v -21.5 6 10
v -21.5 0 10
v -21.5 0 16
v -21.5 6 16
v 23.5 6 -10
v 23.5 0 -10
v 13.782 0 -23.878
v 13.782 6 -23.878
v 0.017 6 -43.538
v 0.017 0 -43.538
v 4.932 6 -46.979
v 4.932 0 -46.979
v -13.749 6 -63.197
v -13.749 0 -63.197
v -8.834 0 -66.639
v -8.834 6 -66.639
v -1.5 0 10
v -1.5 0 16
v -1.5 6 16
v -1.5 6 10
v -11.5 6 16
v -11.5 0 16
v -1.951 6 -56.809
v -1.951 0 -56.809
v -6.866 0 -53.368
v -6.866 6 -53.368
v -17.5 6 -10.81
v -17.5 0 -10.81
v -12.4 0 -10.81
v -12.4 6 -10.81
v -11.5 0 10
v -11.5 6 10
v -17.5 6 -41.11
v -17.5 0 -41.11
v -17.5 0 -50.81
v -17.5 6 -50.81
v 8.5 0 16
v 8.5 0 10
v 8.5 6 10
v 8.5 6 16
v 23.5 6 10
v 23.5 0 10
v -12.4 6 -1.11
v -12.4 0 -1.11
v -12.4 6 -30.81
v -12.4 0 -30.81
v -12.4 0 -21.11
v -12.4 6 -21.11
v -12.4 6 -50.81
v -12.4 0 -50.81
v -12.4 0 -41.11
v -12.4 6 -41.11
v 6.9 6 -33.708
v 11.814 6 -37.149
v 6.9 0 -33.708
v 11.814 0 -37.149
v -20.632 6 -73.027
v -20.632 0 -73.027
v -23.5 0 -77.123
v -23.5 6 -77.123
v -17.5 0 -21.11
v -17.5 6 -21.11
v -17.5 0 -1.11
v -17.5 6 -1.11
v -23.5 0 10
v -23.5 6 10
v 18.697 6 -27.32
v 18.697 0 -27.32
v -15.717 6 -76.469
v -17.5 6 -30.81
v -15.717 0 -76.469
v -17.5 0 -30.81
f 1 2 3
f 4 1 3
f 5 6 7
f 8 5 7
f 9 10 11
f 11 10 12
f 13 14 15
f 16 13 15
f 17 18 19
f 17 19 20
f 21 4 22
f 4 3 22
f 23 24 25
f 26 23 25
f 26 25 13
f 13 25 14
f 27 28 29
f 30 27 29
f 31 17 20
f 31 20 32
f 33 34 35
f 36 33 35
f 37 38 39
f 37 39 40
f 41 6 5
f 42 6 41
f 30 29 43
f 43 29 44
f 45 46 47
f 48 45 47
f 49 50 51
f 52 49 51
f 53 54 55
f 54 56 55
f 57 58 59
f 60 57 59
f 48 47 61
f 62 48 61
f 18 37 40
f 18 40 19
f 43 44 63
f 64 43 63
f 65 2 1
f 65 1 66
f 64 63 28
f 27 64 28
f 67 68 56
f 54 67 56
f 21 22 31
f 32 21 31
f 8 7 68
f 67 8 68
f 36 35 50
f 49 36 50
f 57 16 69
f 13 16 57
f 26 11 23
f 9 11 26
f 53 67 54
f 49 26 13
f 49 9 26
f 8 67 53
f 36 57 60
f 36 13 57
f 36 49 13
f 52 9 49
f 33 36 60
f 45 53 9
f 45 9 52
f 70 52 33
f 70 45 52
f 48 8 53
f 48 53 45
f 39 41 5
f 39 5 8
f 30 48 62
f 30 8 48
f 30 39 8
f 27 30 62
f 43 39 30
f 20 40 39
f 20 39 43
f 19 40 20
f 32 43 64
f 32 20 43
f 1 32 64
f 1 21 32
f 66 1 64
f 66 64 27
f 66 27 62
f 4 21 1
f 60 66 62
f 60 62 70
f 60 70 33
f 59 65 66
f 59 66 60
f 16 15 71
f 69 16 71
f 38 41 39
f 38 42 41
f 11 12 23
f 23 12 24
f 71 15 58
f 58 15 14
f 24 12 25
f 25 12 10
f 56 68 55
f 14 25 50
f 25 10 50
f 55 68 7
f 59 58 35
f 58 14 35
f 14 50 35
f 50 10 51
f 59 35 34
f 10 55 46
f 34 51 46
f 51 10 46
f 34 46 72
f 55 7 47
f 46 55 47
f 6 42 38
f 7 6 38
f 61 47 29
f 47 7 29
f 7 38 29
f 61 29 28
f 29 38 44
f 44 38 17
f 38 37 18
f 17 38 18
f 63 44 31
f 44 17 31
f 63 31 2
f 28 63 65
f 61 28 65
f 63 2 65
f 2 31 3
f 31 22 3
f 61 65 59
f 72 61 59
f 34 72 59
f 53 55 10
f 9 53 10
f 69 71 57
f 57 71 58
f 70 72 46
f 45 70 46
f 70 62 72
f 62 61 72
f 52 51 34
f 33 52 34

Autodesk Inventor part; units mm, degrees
ref_plane "YZ Plane" through (0, 0, 0) normal (1, 0, 0) x (0, 1, 0)
ref_plane "XZ Plane" through (0, 0, 0) normal (0, 1, 0) x (-1, 0, 0)
ref_plane "XY Plane" through (0, 0, 0) normal (0, 0, 1) x (1, 0, 0)
sketch "Sketch2" plane through (0, 0, 0) normal (0, 1, 0) x (-1, 0, 0)
  line L0 (-23.5, 10) -> (23.5, 10)
  line L1 (23.5, 10) -> (23.5, -10)
  line L2 (23.5, -10) -> (17.5, -10)
  line L3 (-23.5, -10) -> (-23.5, 10)
  line L4 (-23.5, 10) -> (23.5, -10) construction
  line L5 (23.5, 10) -> (-23.5, -10) construction
  line L6 (21.5, 16) -> (11.5, 16)
  line L7 (11.5, 16) -> (11.5, 10)
  line L8 (11.5, 10) -> (21.5, 10)
  line L9 (21.5, 10) -> (21.5, 16)
  line L10 (-23.5, -10) -> (23.5, -77.123)
  line L11 (-23.5, -10) -> (58.442, -10) construction
  line L12 (23.5, -77.123) -> (23.5, -10)
  line L13 (20.6321, -73.0272) -> (13.7492, -63.1974)
  line L14 (13.7492, -63.1974) -> (8.8343, -66.6388)
  line L15 (8.8343, -66.6388) -> (15.7172, -76.4687)
  line L16 (15.7172, -76.4687) -> (20.6321, -73.0272)
  line L17 (6.8663, -53.3675) -> (-0.0166, -43.5377)
  line L18 (1.9514, -56.809) -> (6.8663, -53.3675)
  line L19 (-4.9315, -46.9792) -> (1.9514, -56.809)
  line L20 (-0.0166, -43.5377) -> (-4.9315, -46.9792)
  line L21 (-6.8996, -33.7079) -> (-13.7825, -23.8781)
  line L22 (-11.8145, -37.1494) -> (-6.8996, -33.7079)
  line L23 (-18.6974, -27.3195) -> (-11.8145, -37.1494)
  line L24 (-13.7825, -23.8781) -> (-18.6974, -27.3195)
  line L25 (1.5, 10) -> (-8.5, 10)
  line L26 (-8.5, 10) -> (-8.5, 16)
  line L27 (-8.5, 16) -> (1.5, 16)
  line L28 (1.5, 16) -> (1.5, 10)
  line L29 (-19.5182, -15.6866) -> (-23.5, -10)
  line L30 (-23.5, -10) -> (-28.4149, -13.4415)
  line L31 (-28.4149, -13.4415) -> (-24.4331, -19.128)
  line L32 (-24.4331, -19.128) -> (-19.5182, -15.6866)
  line L33 (17.5, -50.8098) -> (12.4, -50.8098)
  line L34 (12.4, -50.8098) -> (12.4, -41.1098)
  line L35 (12.4, -41.1098) -> (17.5, -41.1098)
  line L36 (17.5, -41.1098) -> (17.5, -50.8098)
  line L37 (17.5, -30.8098) -> (12.4, -30.8098)
  line L38 (17.5, -21.1098) -> (17.5, -30.8098)
  line L39 (12.4, -21.1098) -> (17.5, -21.1098)
  line L40 (12.4, -30.8098) -> (12.4, -21.1098)
  line L41 (17.5, -10.8098) -> (12.4, -10.8098)
  line L42 (17.5, -1.1098) -> (17.5, -10.8098)
  line L43 (12.4, -1.1098) -> (17.5, -1.1098)
  line L44 (12.4, -10.8098) -> (12.4, -1.1098)
  line L45 (12.4, -10) -> (-23.5, -10)
  line L46 (17.5, -10) -> (12.4, -10)
  point P0 (0, 0)
  dimension "d9" = 20
  dimension "d19" = 10
  dimension "d20" = 6
  dimension "d21" = 2
  dimension "d41" = 55
  dimension "d42" = 6
  dimension "d45" = 24
  dimension "d50" = 5
  dimension "d51" = 12
  dimension "d52" = 10
  dimension "d53" = 6
  dimension "d54" = 10
  dimension "d55" = 47
  dimension "d56" = 10
  dimension "d57" = 5.1
  dimension "d58" = 9.7
  dimension "d61" = 20
  dimension "d66" = 6
  dimension "d67" = 6
extrude "Extrusion2" add sketch "Sketch2" along normal blind 6 contours L0 L1 L2 L42 L43 L44 L45 L3 | L26 L27 L28 L0 | L45 L44 L41 L42 L2 L12 L10 | L7 L6 L9 L0 | L10 L22 L23 L24 | L10 L18 L19 L20 | L16 L15 L14 L10
properties part number "phone_holder_slider_side" material "Acrylic, Clear"
